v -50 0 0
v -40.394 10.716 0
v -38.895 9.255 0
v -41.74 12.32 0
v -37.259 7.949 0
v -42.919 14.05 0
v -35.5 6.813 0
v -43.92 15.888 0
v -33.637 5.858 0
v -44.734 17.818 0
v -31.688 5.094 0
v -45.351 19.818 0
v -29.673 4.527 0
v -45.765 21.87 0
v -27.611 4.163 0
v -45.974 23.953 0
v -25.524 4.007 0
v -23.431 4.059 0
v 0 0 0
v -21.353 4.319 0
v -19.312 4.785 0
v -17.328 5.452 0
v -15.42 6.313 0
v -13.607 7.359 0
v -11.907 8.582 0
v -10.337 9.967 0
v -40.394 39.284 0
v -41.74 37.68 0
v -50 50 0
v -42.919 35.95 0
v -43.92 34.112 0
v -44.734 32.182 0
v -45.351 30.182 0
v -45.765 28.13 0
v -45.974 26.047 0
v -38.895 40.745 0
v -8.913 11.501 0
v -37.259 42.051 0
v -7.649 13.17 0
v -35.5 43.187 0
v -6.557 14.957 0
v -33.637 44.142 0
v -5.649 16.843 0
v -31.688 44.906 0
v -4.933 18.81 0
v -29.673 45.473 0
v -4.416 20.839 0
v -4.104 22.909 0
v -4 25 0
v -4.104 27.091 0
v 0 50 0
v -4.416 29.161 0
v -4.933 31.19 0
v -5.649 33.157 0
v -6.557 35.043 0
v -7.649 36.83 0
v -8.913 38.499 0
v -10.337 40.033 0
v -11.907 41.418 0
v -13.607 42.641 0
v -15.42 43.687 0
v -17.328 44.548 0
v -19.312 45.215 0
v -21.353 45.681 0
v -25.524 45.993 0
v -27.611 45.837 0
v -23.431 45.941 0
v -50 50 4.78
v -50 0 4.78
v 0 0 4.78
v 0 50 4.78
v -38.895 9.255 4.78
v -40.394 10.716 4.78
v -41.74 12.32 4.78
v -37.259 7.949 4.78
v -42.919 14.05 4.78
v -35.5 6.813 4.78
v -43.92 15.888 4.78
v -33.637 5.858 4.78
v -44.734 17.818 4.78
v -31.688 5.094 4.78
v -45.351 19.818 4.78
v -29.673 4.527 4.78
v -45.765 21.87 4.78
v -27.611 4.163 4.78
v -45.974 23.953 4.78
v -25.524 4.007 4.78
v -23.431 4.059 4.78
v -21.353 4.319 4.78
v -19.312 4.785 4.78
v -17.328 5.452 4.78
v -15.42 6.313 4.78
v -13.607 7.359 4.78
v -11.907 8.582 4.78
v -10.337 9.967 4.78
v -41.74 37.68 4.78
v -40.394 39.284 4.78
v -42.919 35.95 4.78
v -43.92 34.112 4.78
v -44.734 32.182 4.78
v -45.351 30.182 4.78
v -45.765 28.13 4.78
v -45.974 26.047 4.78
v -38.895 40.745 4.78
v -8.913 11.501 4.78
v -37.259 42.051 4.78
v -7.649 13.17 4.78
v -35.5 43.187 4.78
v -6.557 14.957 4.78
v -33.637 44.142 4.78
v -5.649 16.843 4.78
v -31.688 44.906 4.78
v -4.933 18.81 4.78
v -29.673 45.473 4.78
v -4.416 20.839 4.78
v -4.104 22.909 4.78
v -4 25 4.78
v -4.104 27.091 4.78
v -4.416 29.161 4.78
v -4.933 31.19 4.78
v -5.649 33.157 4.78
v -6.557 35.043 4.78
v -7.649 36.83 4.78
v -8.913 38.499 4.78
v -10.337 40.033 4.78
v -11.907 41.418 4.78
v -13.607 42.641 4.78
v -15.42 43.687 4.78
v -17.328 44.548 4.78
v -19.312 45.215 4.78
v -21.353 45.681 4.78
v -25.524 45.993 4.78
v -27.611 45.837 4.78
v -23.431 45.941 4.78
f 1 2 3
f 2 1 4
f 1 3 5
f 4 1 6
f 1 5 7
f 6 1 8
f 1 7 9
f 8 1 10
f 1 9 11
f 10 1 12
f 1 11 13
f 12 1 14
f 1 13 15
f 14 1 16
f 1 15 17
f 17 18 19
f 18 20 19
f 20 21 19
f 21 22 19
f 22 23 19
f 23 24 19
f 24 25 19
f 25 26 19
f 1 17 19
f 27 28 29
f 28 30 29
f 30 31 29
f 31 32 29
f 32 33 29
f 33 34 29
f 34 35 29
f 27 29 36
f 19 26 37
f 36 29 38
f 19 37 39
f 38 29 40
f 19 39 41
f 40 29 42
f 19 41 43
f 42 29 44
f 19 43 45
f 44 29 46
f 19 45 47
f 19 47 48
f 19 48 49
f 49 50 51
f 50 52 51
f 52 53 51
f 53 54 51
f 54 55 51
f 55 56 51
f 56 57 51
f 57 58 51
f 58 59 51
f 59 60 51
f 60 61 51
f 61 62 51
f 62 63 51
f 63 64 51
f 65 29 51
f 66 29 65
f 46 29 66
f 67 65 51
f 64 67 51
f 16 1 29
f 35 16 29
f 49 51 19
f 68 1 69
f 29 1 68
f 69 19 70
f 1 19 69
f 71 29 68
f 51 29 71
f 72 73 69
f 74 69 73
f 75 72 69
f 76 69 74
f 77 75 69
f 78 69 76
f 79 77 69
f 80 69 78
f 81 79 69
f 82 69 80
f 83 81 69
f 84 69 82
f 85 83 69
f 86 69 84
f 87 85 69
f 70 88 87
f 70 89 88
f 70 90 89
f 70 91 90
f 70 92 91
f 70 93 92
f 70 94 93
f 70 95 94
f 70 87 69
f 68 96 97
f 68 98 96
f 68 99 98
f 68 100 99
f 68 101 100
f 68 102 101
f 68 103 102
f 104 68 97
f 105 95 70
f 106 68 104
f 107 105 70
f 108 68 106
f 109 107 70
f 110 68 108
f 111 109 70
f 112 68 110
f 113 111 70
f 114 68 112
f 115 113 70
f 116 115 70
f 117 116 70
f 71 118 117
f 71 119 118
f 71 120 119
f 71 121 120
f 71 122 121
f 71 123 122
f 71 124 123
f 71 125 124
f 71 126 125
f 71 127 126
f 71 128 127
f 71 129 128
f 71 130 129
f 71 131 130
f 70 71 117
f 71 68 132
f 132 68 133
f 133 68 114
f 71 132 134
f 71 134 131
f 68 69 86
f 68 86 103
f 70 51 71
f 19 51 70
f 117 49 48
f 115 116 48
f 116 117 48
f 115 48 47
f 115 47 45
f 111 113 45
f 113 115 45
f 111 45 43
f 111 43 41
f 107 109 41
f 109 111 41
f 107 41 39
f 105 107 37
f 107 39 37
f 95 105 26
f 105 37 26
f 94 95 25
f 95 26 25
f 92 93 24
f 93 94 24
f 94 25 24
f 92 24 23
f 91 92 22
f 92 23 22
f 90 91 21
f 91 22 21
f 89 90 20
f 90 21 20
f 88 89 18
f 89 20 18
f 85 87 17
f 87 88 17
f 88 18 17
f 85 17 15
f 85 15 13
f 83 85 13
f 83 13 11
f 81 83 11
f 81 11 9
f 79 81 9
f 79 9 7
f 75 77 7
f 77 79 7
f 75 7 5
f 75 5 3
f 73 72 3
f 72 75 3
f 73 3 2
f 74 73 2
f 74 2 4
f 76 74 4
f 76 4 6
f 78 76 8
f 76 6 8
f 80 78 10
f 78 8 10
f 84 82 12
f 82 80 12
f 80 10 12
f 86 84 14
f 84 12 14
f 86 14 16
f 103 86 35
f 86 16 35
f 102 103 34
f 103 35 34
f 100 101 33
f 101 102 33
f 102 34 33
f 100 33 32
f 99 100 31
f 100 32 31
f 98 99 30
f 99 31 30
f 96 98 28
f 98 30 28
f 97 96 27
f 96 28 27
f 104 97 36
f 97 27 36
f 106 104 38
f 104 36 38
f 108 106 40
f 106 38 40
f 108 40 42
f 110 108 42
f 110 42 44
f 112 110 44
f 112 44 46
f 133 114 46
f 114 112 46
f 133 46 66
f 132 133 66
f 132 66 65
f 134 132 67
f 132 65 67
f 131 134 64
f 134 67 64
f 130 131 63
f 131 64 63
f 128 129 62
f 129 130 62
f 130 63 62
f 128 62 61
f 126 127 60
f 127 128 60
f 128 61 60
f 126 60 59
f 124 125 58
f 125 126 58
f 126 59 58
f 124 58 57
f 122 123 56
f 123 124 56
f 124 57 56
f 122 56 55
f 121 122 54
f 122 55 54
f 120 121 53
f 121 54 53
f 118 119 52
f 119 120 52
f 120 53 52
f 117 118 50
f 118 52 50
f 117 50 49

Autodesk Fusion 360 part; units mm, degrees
sketch "Sketch1" plane through (0, 0, 0) normal (0, 0, 1) x (1, 0, 0)
  line L0 (0, 0) -> (-50, 0)
  line L1 (-50, 0) -> (-50, 50)
  line L2 (-50, 50) -> (0, 50)
  line L3 (0, 50) -> (0, 0)
  circle A0 centre (-25, 25) radius 21
  dimension "d1" = 42
extrude "Extrude1" add sketch "Sketch1" along normal blind 4.78
